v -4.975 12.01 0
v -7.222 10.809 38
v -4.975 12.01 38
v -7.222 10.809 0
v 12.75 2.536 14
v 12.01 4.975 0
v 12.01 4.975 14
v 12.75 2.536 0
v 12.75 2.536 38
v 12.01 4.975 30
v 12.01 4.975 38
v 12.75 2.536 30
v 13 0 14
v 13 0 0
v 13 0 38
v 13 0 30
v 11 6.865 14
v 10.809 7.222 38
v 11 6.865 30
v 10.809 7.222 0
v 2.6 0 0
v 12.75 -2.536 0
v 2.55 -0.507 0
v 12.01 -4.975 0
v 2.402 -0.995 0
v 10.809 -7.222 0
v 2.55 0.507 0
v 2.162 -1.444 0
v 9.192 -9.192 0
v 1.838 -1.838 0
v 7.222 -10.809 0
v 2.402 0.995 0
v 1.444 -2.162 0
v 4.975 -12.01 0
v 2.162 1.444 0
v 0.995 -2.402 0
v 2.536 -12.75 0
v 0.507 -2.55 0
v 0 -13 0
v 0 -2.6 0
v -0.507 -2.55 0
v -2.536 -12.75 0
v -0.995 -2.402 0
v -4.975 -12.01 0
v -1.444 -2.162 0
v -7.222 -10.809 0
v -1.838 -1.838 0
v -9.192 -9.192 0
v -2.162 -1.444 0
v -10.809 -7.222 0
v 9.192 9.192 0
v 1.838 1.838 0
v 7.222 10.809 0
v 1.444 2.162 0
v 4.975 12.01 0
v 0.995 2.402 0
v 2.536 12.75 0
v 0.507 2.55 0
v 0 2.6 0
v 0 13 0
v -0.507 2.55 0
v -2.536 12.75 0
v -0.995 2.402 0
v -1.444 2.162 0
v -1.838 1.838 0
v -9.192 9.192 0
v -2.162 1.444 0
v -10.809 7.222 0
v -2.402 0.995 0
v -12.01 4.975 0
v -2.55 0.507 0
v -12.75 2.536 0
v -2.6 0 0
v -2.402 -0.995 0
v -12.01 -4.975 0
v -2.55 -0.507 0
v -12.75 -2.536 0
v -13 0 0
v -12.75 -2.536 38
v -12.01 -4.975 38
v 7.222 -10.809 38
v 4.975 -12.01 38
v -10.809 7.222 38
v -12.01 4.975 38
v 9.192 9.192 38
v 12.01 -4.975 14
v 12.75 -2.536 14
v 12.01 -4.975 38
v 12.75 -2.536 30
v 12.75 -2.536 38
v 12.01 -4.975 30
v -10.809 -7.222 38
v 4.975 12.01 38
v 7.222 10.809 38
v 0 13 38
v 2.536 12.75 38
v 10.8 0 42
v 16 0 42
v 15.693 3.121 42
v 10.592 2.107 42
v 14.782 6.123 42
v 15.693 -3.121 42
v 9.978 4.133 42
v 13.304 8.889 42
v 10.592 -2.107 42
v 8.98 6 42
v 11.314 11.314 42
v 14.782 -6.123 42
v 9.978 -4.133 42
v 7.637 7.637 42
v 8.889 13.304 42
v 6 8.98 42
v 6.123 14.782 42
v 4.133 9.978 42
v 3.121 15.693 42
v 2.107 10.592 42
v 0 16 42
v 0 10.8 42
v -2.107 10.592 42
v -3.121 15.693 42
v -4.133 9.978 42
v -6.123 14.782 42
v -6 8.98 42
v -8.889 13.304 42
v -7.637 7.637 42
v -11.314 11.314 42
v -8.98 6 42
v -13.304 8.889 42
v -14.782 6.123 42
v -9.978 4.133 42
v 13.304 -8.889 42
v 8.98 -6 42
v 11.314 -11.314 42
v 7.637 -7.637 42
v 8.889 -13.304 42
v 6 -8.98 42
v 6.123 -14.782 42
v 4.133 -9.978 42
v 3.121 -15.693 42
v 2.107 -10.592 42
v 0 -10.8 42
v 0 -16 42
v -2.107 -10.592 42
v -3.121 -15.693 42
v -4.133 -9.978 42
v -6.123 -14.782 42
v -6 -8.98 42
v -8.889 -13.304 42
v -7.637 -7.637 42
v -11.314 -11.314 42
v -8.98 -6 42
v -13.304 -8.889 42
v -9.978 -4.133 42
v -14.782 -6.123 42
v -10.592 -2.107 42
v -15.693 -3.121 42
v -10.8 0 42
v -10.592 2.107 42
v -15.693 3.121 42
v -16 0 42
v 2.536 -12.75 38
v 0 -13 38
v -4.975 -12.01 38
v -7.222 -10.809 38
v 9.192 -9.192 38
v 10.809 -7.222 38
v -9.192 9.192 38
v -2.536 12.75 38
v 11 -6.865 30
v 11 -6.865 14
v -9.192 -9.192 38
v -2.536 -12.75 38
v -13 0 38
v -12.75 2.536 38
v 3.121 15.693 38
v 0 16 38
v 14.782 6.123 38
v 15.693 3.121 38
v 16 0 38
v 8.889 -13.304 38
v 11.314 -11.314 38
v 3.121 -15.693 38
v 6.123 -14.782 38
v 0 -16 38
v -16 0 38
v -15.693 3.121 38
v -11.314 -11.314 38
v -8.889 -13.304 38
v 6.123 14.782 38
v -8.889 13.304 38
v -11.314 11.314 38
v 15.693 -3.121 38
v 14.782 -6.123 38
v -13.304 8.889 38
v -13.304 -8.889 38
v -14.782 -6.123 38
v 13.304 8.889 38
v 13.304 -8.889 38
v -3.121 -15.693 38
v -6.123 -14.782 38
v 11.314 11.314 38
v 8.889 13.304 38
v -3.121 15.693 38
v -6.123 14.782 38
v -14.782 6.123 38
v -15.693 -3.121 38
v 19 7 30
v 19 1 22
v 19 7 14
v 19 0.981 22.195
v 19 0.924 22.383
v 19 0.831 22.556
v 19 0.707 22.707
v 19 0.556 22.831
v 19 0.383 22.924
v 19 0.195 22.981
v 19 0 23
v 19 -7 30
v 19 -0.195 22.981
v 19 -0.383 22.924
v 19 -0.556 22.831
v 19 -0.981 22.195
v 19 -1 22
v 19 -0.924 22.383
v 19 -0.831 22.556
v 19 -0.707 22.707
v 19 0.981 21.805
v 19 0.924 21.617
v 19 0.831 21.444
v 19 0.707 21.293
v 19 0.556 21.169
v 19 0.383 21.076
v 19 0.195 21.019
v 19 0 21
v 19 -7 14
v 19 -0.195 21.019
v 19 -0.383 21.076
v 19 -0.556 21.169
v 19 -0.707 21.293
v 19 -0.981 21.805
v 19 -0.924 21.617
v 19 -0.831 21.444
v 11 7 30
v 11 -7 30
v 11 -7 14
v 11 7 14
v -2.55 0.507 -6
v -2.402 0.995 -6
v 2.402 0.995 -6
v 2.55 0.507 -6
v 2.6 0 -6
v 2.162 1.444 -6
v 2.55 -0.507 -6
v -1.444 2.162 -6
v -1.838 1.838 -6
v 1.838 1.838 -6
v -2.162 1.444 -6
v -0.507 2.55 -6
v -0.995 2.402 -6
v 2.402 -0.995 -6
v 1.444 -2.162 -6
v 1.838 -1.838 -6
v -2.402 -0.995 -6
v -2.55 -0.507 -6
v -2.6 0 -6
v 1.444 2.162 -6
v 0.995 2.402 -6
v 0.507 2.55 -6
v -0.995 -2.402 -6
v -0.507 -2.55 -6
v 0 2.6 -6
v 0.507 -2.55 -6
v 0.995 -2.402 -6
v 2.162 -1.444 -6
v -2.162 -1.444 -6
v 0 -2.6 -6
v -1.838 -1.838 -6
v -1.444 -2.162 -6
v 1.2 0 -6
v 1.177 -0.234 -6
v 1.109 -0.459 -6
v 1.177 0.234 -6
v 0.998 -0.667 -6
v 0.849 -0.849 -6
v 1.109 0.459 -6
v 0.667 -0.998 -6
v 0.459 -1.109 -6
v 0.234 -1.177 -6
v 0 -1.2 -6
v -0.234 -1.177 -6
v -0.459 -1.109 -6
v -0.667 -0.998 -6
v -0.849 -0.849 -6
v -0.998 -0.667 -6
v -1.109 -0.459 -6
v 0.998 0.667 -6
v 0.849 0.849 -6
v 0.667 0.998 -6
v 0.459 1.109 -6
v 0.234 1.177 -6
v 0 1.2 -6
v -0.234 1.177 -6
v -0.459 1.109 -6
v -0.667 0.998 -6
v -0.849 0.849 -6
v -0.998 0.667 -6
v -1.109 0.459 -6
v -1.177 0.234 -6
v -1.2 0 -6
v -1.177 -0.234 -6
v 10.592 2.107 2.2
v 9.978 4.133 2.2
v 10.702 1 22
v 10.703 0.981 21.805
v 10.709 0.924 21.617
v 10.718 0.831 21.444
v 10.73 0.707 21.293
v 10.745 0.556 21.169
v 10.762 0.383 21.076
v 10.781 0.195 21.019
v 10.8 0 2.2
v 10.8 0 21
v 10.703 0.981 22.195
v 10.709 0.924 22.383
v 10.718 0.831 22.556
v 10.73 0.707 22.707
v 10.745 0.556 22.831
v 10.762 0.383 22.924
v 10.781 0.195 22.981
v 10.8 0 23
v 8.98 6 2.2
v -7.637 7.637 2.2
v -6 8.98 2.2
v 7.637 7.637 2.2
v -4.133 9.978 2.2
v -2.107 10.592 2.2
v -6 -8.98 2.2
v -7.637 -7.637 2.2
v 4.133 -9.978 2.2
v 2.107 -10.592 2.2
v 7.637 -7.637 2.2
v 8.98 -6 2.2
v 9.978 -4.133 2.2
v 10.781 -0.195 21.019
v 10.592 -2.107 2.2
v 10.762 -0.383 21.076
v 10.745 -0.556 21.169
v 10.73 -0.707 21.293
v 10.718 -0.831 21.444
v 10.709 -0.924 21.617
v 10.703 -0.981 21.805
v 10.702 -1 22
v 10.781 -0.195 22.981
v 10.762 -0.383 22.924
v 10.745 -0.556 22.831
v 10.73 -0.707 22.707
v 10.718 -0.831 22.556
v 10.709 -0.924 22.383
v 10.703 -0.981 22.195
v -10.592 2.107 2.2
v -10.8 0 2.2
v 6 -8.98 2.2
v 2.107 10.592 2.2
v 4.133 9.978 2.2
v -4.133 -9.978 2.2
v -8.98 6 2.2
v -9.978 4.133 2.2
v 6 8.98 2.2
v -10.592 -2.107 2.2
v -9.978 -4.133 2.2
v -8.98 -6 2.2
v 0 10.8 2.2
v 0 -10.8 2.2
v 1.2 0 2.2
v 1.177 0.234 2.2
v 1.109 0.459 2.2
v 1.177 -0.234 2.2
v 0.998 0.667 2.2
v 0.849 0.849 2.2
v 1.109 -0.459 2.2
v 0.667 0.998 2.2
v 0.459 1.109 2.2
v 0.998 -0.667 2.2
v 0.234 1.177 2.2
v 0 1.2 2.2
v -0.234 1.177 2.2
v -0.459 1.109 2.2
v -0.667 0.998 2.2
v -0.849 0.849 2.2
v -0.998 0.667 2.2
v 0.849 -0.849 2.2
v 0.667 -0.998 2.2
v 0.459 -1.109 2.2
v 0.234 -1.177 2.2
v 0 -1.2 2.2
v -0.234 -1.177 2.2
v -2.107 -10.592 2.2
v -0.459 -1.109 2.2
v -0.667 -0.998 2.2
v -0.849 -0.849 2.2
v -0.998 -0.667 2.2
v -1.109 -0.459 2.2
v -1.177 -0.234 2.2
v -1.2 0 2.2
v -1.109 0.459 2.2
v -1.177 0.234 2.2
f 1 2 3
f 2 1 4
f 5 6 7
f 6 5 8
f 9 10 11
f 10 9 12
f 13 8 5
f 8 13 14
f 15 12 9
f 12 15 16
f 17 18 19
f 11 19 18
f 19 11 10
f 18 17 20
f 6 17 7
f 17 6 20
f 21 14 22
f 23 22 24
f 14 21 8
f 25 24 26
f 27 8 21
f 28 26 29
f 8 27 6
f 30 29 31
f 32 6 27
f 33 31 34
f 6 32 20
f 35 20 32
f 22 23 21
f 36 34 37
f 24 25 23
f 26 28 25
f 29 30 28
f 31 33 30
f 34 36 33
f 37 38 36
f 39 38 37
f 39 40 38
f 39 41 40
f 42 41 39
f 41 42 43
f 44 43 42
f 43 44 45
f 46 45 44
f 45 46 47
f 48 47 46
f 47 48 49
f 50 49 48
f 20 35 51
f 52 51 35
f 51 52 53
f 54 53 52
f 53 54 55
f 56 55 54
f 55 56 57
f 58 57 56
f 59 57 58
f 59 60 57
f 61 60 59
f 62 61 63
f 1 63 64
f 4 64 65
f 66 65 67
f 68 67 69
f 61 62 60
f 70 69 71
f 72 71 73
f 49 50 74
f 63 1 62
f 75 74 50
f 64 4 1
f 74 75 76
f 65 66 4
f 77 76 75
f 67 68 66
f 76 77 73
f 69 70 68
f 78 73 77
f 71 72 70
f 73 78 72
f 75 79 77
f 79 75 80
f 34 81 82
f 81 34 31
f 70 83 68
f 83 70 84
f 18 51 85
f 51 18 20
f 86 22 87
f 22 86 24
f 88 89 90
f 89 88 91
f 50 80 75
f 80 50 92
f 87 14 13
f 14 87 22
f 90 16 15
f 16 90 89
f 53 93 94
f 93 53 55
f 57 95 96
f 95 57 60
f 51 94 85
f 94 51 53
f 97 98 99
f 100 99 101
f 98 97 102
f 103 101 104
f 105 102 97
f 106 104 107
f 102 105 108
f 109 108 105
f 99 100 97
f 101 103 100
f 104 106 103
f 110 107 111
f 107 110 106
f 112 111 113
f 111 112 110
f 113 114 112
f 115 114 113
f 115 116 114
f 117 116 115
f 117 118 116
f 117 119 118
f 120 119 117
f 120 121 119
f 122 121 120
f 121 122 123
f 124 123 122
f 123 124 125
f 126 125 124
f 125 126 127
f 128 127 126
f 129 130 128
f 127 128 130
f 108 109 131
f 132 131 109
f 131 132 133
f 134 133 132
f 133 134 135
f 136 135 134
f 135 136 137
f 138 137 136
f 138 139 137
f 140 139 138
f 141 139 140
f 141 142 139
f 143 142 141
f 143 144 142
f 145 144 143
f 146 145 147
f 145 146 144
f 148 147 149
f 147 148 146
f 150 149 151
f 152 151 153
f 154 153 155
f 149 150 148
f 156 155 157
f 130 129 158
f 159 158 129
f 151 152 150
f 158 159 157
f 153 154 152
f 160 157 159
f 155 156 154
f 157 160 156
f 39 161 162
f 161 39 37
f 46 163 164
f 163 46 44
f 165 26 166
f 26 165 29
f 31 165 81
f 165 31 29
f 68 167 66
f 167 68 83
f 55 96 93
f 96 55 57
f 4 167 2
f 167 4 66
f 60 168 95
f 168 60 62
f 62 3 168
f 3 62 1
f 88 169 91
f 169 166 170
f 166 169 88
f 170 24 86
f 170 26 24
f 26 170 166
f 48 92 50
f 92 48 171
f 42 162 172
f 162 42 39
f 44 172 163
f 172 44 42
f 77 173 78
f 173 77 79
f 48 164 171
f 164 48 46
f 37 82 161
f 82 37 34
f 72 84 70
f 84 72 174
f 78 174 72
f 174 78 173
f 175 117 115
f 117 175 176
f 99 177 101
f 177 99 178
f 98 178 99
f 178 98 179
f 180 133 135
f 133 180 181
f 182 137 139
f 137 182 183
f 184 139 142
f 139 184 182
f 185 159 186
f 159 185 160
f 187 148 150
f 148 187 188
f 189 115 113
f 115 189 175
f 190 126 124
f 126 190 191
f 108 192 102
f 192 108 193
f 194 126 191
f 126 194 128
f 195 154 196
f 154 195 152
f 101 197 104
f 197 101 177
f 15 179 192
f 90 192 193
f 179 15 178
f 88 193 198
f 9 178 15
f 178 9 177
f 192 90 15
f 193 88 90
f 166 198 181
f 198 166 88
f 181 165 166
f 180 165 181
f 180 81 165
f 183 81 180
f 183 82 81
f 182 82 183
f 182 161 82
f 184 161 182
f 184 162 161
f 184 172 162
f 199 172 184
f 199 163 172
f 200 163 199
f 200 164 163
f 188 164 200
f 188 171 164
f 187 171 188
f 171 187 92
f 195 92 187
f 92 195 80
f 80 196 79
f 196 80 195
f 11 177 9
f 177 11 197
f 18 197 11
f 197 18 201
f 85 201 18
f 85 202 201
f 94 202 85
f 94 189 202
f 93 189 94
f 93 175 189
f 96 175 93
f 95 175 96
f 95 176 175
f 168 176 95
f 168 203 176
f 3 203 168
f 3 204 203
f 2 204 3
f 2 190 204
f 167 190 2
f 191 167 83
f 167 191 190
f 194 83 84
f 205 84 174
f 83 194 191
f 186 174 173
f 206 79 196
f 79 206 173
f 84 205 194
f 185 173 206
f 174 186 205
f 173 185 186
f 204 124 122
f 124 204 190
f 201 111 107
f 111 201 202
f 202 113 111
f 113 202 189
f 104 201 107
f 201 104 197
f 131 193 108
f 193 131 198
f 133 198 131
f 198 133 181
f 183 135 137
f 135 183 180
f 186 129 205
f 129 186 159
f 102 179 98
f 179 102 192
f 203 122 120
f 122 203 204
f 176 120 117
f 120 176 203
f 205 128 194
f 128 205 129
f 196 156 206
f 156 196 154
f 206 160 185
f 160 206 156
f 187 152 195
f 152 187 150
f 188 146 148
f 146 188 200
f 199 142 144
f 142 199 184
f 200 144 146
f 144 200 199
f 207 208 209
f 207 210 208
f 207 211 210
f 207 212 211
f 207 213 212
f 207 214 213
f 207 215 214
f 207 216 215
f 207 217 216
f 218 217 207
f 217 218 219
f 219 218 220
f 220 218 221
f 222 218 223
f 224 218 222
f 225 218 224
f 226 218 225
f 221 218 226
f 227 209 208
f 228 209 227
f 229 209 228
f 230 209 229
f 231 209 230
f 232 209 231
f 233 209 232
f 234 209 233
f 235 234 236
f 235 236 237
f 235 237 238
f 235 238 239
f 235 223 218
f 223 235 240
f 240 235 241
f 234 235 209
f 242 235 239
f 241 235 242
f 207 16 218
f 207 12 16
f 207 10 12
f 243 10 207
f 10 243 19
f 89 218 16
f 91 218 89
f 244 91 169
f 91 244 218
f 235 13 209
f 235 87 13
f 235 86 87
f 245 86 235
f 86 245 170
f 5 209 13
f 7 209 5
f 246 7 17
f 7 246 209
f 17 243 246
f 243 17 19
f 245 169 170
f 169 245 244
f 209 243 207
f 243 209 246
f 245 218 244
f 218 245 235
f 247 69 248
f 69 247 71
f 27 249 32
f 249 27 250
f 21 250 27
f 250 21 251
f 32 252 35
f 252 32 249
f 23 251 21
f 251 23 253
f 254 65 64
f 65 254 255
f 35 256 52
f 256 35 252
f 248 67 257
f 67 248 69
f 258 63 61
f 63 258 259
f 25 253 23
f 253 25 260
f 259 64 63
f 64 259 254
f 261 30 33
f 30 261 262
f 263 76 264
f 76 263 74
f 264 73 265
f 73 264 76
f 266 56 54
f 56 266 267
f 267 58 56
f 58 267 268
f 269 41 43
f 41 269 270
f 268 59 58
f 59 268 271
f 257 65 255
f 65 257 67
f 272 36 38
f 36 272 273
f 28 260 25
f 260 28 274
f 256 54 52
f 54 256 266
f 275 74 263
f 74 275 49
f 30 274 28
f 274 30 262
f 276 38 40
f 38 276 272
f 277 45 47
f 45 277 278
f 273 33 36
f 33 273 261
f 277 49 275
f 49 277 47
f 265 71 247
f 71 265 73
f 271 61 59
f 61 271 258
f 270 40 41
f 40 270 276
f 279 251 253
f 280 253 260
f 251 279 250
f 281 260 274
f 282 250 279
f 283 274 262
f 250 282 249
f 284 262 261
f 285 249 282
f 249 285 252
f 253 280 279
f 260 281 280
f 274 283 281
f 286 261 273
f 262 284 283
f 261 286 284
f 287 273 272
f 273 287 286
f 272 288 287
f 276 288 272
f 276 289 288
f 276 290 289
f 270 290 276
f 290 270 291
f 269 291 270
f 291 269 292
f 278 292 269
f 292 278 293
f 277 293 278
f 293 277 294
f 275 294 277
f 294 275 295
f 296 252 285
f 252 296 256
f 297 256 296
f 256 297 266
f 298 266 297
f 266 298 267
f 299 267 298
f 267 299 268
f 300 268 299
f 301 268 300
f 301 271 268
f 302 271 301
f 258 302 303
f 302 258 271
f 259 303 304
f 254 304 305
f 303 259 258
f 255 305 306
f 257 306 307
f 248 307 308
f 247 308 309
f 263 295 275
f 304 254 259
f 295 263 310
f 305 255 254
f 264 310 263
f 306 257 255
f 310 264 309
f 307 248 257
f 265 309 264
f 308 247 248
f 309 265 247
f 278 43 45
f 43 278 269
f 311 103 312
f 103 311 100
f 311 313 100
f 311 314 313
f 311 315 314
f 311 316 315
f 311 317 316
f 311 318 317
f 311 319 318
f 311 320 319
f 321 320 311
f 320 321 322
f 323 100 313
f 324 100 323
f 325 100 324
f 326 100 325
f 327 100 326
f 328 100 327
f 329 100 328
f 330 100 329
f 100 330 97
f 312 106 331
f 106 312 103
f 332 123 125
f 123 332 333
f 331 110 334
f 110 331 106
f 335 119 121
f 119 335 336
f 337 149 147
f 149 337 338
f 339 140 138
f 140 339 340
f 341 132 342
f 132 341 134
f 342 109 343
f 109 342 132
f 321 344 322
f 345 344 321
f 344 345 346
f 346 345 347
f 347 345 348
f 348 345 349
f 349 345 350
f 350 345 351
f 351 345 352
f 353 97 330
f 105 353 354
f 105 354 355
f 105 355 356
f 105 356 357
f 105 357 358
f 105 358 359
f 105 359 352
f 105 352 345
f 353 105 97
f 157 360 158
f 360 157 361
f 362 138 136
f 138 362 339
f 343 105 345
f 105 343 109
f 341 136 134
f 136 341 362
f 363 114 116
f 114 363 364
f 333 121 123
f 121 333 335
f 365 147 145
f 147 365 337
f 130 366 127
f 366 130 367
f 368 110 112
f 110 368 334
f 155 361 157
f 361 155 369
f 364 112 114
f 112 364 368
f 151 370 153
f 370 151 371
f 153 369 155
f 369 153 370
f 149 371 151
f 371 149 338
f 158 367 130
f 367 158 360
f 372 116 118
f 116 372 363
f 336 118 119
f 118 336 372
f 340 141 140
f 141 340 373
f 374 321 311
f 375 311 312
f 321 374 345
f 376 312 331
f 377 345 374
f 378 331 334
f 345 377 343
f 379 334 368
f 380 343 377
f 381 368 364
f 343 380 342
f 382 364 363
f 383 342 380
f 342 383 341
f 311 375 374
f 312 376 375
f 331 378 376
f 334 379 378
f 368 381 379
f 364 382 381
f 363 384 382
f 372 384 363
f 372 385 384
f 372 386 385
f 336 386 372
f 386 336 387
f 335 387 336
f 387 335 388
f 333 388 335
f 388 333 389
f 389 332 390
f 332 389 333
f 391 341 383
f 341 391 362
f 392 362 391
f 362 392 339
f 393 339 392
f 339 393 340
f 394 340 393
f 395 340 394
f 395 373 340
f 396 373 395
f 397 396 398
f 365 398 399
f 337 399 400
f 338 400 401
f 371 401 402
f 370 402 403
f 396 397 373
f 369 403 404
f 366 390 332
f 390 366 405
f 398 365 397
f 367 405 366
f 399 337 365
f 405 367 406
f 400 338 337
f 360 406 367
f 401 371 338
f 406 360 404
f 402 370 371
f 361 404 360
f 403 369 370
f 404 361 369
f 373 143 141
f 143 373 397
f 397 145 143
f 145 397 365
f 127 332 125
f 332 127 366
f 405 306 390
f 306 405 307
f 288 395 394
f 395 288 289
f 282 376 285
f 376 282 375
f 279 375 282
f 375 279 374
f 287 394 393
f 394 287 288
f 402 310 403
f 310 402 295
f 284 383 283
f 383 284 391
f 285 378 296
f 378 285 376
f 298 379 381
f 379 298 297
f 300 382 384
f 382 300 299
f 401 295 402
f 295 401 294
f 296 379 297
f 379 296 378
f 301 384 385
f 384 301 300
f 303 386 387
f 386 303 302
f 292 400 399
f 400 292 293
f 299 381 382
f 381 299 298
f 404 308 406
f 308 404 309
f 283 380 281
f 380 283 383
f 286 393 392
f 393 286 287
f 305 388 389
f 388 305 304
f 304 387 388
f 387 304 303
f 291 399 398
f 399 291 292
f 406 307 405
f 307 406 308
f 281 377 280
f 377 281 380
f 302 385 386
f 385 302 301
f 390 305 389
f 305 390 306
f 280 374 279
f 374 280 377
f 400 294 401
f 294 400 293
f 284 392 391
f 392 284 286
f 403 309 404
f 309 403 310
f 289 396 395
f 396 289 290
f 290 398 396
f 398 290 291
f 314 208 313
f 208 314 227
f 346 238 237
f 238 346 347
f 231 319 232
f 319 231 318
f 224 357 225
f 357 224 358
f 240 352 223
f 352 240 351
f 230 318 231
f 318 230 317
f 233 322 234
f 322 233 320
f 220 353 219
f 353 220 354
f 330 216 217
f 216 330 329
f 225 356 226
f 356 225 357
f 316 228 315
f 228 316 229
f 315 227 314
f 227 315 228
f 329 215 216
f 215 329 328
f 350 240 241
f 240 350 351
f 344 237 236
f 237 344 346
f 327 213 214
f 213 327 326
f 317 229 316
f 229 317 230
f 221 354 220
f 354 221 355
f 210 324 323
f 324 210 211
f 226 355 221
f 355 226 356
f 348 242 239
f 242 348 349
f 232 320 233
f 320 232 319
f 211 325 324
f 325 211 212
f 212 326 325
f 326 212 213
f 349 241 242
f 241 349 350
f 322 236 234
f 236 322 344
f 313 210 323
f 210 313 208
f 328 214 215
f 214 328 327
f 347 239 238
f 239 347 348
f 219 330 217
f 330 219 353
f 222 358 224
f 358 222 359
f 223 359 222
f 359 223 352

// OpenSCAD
// PROJECT W.A.L.L. - HYPER-ACTUATOR Mk-1: Constant Meniscus Negative-Pressure Tank & Damper
// Drawing Ref: DWG-WALL-HACT-005 | Material: Chemical-Resistant Translucent POM / PTFE
// Holds 18 mL Ink Reservoir. Maintains -1.45 kPa ± 0.05 kPa Meniscus Vacuum via Micro-Diaphragm.
// Complies with ISO 2768-mK tolerances | Designed for FDM / SLA 3D Printing

$fn = 32;

module meniscus_fluidic_damper(
    tank_dia = 26.0,
    tank_h = 42.0,
    wall_t = 2.2,
    sensor_boss_w = 14.0,
    sensor_boss_h = 16.0
) {
    difference() {
        union() {
            cylinder(d=tank_dia, h=tank_h);
            translate([0, 0, tank_h - 4.0])
                cylinder(d=tank_dia + 6.0, h=4.0);
            translate([tank_dia/2 - 2.0, -sensor_boss_w/2, 14.0])
                cube([8.0, sensor_boss_w, sensor_boss_h]);
            translate([0, 0, -6.0])
                cylinder(d=5.2, h=6.0);
        }

        // 1. Internal Degassing & Fluid Buffer Chamber
        translate([0, 0, wall_t])
            cylinder(d=tank_dia - 2*wall_t, h=tank_h);

        // 2. Liquid Discharge Port (Feeds 128-Nozzle Manifold)
        translate([0, 0, -7.0])
            cylinder(d=2.4, h=wall_t + 8.0);

        // 3. Top Vacuum Air Port
        translate([-5.0, 0, tank_h - 6.0])
            cylinder(d=3.2, h=10.0);

        // 4. Secondary De-aeration / Purge Inlet Port
        translate([ 5.0, 0, tank_h - 6.0])
            cylinder(d=3.2, h=10.0);

        // 5. Differential Pressure Transducer Sense Tap Bore
        translate([tank_dia/2 - 4.0, 0, 22.0])
            rotate([0, 90, 0])
                cylinder(d=2.0, h=10.0);
    }
}

meniscus_fluidic_damper();
